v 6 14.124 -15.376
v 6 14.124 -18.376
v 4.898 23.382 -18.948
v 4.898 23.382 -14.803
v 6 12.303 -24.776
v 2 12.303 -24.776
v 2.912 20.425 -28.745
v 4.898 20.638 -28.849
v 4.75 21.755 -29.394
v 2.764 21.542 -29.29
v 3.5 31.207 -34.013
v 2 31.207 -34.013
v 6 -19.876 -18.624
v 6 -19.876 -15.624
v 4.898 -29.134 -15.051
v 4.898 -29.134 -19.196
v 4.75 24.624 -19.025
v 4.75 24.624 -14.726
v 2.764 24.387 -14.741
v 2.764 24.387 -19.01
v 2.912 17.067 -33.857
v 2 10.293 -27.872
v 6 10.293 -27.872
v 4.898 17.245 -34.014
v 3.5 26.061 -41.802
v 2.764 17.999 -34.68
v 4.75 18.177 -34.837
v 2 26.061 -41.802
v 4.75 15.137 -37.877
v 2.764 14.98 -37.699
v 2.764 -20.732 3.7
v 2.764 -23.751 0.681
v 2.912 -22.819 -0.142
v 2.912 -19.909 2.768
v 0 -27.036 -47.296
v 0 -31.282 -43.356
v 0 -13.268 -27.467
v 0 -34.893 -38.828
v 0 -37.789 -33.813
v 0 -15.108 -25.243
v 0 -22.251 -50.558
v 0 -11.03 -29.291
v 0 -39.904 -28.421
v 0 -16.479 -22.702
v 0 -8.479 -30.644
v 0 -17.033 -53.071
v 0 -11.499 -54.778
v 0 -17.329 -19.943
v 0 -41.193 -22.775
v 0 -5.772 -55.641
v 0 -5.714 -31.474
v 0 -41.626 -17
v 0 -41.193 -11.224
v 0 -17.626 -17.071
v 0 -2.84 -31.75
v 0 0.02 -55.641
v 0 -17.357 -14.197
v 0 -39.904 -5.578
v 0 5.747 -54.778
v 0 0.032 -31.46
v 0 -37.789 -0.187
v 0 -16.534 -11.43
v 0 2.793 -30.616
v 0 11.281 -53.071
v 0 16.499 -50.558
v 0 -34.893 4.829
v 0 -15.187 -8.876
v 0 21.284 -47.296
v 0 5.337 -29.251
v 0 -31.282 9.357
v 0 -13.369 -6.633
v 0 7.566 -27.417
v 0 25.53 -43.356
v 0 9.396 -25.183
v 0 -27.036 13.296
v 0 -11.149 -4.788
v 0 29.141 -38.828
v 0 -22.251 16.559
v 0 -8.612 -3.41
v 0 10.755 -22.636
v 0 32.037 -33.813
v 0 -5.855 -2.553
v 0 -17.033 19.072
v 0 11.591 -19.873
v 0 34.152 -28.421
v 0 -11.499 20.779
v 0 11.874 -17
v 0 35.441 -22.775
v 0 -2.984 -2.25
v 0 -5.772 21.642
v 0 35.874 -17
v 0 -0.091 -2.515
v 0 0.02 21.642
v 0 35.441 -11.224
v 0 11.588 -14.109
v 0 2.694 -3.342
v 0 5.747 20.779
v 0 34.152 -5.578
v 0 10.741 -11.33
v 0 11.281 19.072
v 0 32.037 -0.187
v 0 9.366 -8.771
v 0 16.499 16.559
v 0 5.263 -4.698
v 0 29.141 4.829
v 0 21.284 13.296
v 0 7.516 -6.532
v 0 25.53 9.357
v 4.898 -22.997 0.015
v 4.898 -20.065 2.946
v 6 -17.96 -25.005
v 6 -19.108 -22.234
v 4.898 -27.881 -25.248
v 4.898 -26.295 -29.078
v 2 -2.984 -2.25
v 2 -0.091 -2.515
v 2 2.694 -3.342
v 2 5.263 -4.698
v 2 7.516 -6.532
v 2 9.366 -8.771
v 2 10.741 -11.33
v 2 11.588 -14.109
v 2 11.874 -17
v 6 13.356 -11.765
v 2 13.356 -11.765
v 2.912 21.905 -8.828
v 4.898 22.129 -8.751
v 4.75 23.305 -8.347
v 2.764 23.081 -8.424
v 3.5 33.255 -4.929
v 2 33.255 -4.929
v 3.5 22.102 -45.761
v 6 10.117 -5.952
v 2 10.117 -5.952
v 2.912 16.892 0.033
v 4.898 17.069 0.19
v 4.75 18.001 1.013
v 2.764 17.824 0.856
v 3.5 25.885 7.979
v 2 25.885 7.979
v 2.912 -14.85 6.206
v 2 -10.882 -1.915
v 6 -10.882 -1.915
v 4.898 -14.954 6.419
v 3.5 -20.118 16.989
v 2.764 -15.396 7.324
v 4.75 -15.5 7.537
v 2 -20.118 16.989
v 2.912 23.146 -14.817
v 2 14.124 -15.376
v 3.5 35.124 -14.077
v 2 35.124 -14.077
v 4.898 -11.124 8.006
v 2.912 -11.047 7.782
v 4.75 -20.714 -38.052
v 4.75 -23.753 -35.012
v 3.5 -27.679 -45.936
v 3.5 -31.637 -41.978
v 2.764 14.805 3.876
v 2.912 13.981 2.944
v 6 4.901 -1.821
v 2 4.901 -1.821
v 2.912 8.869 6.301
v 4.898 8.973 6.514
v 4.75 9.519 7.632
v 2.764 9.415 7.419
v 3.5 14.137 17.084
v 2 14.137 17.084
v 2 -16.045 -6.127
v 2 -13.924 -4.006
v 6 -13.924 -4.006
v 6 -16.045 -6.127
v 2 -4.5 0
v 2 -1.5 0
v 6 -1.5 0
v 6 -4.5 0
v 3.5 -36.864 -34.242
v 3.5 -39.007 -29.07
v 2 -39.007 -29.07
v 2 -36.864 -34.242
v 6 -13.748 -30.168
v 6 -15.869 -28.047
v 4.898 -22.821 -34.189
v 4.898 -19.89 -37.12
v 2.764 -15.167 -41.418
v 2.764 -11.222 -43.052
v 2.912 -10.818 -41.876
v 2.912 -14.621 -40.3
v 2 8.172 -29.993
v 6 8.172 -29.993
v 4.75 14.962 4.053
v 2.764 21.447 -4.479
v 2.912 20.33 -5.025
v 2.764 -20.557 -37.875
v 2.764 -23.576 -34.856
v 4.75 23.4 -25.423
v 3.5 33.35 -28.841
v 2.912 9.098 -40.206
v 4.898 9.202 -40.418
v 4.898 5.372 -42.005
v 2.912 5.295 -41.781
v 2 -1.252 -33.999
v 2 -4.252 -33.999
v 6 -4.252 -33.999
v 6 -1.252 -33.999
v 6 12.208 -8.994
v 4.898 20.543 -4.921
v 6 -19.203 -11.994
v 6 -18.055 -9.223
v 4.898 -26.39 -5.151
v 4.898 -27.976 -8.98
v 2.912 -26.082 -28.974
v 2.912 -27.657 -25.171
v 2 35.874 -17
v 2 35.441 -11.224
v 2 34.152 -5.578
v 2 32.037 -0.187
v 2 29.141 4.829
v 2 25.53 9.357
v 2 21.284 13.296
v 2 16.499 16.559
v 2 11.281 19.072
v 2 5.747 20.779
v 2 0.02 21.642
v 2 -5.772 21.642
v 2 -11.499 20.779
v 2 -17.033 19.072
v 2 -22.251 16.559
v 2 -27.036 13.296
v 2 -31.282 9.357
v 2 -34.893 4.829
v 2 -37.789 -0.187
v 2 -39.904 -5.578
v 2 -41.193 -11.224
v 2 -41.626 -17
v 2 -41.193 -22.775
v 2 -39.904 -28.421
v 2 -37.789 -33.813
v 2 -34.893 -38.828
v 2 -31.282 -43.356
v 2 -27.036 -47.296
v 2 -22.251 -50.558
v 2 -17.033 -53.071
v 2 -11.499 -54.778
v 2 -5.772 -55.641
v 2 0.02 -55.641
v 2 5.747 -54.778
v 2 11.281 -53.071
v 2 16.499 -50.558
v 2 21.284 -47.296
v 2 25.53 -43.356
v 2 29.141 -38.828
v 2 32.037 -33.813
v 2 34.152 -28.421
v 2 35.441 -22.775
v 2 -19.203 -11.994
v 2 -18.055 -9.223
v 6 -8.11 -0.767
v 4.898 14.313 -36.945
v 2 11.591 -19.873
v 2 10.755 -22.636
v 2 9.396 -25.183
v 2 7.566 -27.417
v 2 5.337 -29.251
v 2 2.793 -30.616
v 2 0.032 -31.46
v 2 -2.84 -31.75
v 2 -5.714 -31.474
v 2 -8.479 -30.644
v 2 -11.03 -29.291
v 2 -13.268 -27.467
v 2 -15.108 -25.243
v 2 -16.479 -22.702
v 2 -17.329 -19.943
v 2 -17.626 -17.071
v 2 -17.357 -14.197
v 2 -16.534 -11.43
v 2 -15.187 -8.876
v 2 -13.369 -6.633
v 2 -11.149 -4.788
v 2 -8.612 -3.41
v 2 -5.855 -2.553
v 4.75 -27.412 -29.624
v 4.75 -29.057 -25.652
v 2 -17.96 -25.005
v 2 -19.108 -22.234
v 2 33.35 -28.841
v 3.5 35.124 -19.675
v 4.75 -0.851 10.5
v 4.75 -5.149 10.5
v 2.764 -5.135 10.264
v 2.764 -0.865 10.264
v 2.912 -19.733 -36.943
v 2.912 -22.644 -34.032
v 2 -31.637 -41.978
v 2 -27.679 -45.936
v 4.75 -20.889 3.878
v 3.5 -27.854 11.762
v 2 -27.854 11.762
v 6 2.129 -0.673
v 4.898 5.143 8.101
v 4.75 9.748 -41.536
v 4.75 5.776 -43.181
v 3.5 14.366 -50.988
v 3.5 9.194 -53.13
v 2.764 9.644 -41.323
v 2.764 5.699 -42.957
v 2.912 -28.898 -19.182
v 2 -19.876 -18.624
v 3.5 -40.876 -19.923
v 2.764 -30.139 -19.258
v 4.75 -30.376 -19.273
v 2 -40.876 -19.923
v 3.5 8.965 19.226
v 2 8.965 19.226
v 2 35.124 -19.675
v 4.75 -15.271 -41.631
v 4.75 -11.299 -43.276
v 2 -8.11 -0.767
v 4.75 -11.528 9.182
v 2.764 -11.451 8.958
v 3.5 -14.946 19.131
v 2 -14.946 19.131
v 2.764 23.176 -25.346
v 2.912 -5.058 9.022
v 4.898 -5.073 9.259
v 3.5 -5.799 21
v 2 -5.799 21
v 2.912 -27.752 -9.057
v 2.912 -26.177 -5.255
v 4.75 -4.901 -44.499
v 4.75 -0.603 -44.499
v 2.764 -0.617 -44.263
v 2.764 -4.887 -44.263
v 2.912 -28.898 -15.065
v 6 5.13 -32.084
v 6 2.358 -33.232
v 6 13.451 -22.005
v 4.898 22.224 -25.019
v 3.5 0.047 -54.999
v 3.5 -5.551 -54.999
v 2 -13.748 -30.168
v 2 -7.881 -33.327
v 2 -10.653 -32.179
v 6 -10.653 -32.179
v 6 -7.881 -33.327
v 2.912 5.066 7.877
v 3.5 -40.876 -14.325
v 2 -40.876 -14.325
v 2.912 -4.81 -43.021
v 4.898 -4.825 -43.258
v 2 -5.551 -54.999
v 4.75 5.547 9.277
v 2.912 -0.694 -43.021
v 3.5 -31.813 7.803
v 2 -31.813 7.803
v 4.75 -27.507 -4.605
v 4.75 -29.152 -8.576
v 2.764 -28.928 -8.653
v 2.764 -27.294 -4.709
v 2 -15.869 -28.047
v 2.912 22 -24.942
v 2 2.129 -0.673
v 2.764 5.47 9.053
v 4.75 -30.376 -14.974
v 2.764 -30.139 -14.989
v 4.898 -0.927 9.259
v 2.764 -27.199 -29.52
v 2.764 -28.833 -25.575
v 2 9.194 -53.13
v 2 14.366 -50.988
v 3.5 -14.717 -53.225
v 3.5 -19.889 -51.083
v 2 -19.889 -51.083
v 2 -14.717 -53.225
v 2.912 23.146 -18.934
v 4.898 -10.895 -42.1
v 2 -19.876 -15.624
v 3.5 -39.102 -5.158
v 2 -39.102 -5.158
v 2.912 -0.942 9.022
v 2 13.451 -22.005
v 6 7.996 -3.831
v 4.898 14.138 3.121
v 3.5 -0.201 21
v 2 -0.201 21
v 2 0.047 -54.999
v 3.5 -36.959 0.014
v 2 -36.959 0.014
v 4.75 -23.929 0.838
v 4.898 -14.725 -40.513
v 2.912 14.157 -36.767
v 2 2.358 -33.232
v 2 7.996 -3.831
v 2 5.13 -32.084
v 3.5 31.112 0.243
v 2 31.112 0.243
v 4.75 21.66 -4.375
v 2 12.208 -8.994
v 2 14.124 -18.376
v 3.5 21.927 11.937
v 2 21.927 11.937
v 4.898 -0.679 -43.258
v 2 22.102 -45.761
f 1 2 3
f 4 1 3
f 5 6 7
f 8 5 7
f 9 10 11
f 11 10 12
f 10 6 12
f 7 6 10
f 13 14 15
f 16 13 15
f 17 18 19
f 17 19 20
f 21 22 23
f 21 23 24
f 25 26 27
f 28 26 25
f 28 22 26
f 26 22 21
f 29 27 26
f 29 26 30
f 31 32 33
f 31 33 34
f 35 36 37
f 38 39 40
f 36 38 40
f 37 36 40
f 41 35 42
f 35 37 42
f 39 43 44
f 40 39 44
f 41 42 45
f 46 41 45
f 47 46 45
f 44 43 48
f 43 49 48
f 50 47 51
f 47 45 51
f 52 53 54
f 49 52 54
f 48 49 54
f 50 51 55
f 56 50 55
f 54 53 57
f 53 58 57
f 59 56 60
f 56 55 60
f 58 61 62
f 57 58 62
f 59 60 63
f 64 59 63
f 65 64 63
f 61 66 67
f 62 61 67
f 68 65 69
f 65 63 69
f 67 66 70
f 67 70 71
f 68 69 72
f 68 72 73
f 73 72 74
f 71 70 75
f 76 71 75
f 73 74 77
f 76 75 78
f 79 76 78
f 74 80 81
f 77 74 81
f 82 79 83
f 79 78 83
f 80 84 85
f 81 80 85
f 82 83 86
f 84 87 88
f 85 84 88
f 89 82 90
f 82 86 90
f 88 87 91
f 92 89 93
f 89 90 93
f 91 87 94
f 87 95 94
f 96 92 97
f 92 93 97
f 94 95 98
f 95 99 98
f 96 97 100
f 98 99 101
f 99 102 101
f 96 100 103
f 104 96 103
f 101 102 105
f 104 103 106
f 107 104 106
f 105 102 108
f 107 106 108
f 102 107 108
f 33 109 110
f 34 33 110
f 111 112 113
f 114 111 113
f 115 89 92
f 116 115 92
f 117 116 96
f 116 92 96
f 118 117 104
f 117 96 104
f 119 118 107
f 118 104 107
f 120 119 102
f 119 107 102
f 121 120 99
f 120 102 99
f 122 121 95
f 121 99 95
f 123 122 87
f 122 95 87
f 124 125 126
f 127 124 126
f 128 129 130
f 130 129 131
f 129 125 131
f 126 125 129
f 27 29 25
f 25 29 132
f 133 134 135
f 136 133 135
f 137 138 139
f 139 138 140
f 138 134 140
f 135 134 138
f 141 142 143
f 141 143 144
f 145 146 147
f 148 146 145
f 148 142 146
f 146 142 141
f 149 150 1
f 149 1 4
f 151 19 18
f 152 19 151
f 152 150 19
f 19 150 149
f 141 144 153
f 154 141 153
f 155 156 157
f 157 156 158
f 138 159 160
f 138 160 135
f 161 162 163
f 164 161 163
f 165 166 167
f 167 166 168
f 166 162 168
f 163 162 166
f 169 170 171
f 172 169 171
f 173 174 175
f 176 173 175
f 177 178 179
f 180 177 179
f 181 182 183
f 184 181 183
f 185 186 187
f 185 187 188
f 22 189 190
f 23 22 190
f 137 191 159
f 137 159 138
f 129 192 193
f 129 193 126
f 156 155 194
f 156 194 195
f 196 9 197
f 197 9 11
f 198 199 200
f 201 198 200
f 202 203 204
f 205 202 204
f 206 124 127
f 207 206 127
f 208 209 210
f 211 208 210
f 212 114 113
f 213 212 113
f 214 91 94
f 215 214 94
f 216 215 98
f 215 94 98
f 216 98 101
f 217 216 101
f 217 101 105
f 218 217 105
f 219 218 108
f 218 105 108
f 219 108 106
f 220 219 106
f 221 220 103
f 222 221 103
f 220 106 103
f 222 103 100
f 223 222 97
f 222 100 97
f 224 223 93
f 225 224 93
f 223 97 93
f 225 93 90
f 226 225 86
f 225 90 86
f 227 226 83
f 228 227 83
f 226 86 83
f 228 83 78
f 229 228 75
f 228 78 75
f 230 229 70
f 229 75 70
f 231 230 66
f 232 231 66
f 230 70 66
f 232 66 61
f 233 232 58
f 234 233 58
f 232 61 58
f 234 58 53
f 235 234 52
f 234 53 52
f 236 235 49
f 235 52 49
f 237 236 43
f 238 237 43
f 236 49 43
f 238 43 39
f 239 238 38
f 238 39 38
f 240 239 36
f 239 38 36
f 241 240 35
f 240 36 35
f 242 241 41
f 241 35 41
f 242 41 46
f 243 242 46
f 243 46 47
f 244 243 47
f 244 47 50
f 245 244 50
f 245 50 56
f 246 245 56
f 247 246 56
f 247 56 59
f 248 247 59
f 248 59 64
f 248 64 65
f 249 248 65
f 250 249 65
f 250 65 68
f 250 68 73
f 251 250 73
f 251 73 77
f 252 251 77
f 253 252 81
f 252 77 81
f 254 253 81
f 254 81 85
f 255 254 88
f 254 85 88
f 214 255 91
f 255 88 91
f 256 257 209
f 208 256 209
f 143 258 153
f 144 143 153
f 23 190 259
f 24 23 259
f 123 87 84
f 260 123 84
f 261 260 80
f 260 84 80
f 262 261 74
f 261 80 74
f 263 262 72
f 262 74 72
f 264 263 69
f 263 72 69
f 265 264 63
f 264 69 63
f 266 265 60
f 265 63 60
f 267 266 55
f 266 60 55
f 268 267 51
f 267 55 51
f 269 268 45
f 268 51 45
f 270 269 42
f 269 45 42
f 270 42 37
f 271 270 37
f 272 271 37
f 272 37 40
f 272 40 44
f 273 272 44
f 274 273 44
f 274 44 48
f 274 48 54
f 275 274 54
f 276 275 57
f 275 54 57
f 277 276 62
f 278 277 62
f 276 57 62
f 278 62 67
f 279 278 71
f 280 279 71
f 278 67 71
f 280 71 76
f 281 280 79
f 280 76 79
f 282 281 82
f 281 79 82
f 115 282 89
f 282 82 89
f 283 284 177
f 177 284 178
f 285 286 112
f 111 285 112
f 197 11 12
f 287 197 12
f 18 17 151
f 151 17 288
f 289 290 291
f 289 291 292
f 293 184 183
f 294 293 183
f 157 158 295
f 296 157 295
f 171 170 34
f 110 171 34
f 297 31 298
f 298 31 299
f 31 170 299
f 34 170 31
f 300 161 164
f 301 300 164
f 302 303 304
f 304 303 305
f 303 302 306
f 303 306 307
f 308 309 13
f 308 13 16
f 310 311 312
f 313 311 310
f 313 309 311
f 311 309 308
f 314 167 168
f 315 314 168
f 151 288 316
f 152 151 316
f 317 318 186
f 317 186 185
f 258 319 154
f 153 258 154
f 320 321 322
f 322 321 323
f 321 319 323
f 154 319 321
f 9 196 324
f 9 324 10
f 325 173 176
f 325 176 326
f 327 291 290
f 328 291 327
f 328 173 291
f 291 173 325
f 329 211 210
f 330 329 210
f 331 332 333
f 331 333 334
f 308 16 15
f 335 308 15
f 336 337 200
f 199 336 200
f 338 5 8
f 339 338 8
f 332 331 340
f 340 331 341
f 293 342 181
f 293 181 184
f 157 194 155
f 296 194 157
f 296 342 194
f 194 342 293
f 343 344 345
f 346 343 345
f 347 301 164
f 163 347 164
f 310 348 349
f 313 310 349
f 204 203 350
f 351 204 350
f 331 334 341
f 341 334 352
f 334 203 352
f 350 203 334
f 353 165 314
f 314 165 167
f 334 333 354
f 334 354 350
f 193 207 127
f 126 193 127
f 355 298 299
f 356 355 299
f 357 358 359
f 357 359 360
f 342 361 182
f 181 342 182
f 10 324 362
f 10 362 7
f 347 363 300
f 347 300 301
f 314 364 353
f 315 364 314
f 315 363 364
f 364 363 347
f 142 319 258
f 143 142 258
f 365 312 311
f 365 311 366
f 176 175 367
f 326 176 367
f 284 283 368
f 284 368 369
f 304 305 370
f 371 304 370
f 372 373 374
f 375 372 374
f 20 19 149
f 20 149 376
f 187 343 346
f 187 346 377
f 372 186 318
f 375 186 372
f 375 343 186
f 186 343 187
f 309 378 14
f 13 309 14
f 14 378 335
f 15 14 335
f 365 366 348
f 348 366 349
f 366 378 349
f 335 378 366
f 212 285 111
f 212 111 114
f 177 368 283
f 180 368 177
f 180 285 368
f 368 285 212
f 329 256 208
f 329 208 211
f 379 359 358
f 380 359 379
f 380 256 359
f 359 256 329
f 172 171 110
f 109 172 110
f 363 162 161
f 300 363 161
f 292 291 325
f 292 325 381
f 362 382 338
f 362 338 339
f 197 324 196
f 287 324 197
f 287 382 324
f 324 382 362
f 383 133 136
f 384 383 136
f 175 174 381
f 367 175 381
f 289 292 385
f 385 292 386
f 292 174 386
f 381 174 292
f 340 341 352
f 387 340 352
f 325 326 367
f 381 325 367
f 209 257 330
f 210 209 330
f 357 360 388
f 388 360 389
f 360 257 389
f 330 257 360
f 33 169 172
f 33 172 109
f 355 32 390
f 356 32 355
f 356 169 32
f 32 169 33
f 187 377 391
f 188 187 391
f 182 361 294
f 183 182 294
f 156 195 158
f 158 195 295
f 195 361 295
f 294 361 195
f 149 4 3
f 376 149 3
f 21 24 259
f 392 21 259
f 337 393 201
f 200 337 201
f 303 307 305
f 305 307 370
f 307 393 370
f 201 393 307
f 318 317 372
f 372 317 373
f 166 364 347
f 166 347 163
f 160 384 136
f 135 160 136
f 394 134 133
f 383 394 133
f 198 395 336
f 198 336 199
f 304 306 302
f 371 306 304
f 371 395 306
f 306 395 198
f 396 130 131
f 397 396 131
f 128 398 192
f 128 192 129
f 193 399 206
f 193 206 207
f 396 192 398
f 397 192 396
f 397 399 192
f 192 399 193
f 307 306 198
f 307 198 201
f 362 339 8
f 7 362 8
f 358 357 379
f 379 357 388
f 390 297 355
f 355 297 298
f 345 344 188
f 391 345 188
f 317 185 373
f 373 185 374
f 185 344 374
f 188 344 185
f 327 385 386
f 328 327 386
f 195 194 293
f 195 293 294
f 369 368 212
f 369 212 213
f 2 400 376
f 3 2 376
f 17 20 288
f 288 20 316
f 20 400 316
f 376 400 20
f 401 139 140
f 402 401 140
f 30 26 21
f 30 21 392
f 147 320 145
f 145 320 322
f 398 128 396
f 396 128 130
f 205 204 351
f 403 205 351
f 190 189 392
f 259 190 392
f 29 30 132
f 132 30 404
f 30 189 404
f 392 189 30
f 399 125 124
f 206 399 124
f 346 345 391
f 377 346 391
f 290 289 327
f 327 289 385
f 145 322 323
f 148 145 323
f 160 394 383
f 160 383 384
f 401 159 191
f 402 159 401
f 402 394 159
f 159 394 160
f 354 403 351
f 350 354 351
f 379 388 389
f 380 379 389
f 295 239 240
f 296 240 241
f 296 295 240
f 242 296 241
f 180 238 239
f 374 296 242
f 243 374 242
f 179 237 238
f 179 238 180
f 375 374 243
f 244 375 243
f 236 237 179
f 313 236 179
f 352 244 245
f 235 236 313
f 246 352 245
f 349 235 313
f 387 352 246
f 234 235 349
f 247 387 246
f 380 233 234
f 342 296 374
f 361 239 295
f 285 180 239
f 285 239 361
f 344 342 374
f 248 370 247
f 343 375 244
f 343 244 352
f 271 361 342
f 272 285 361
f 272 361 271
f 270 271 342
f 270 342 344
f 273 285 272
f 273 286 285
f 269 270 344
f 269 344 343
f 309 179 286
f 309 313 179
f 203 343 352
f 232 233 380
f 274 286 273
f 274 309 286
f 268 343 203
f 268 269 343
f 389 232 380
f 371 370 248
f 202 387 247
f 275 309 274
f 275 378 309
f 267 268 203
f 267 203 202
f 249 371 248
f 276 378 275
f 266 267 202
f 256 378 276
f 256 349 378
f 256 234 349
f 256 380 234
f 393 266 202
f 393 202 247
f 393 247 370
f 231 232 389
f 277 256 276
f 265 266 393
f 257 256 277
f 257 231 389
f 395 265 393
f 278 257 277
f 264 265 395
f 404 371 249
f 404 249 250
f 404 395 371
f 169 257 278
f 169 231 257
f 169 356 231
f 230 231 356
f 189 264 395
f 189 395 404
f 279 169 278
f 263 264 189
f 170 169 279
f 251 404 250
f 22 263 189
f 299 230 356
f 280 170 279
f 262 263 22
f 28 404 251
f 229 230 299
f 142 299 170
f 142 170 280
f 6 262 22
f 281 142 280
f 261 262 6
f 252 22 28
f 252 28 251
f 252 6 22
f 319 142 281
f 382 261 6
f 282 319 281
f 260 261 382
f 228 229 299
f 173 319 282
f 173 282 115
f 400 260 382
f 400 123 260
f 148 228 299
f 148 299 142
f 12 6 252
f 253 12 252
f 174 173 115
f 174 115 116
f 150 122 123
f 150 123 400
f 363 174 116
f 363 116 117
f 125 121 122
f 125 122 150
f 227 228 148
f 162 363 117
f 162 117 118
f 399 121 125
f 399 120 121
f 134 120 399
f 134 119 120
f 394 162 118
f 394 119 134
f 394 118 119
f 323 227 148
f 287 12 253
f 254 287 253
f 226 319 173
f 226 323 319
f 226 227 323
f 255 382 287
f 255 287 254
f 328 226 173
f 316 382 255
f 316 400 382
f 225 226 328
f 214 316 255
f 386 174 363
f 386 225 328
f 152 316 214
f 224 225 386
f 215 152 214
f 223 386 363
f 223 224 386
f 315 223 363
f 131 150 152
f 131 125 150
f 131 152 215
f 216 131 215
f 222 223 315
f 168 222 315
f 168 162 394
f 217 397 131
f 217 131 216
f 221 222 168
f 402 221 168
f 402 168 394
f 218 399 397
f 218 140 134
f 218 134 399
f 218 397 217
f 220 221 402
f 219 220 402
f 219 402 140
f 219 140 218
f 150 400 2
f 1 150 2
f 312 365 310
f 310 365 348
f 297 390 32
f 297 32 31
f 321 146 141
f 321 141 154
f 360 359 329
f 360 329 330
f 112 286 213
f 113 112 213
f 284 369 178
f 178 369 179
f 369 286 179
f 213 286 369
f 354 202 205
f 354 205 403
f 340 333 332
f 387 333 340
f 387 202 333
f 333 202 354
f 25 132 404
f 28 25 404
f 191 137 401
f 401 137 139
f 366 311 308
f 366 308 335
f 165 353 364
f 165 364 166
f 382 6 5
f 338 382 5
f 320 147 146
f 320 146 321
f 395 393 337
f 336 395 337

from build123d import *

# Parameters (mm, degrees)
F1_DEPTH    = 6
F2_W        = 6
F2_H        = 1.25
F3_DEPTH    = 2
F4_T1_DEPTH = 132.091103715
F6_COUNT    = 16
F5_R        = 38.75
F7_DEPTH    = 2


# Not quite as in the source:
# - a fillet or chamfer that OpenCascade refuses, or shapes differently, is made with other operations: its cross-section is extruded or revolved along the edge and cut away or added


with BuildPart() as f1:
    # F0 (on Front) → F1 (new body)
    with BuildSketch(Plane.XZ):
        Polygon((0, 21), (0, 0), (6, 0), (3.5, 21), align=None)
    extrude(amount=F1_DEPTH)

    # F2 (on face) → F3 (cut)
    with BuildSketch(Plane(origin=(5.9161542761, 0, 0.7043040805), x_dir=(0, 1, 0), z_dir=(0.9929882742, 0, 0.1182128898))):
        with Locations((-3, 9.2398656526)):
            Rectangle(F2_W, F2_H)
    extrude(amount=-F3_DEPTH, mode=Mode.SUBTRACT)

    # F4: chamfer of 1.5 x 24.25 on 2 edges, made by hand

    # F4_s2 → F4_t1 (cut)
    with BuildSketch(Plane.YZ.offset(-63.0455518575)):
        Polygon((-4.5, 0), (-6, 24.25), (-6, 0), align=None)
        Polygon((-1.5, 0), (0, 24.25), (0, 0), align=None)
    extrude(amount=F4_T1_DEPTH, mode=Mode.SUBTRACT)


with BuildPart() as f6_1:
    # F6: instance of F1
    add(f1.part.rotate(Axis((0, -2.8759991925, -16.9995477528), (1, 0, 0)), 1 * 360 / F6_COUNT))


with BuildPart() as f6_2:
    # F6: instance of F1
    add(f1.part.rotate(Axis((0, -2.8759991925, -16.9995477528), (1, 0, 0)), 2 * 360 / F6_COUNT))


with BuildPart() as f6_3:
    # F6: instance of F1
    add(f1.part.rotate(Axis((0, -2.8759991925, -16.9995477528), (1, 0, 0)), 3 * 360 / F6_COUNT))


with BuildPart() as f6_4:
    # F6: instance of F1
    add(f1.part.rotate(Axis((0, -2.8759991925, -16.9995477528), (1, 0, 0)), 4 * 360 / F6_COUNT))


with BuildPart() as f6_5:
    # F6: instance of F1
    add(f1.part.rotate(Axis((0, -2.8759991925, -16.9995477528), (1, 0, 0)), 5 * 360 / F6_COUNT))


with BuildPart() as f6_6:
    # F6: instance of F1
    add(f1.part.rotate(Axis((0, -2.8759991925, -16.9995477528), (1, 0, 0)), 6 * 360 / F6_COUNT))


with BuildPart() as f6_7:
    # F6: instance of F1
    add(f1.part.rotate(Axis((0, -2.8759991925, -16.9995477528), (1, 0, 0)), 7 * 360 / F6_COUNT))


with BuildPart() as f6_8:
    # F6: instance of F1
    add(f1.part.rotate(Axis((0, -2.8759991925, -16.9995477528), (1, 0, 0)), 8 * 360 / F6_COUNT))


with BuildPart() as f6_9:
    # F6: instance of F1
    add(f1.part.rotate(Axis((0, -2.8759991925, -16.9995477528), (1, 0, 0)), 9 * 360 / F6_COUNT))


with BuildPart() as f6_10:
    # F6: instance of F1
    add(f1.part.rotate(Axis((0, -2.8759991925, -16.9995477528), (1, 0, 0)), 10 * 360 / F6_COUNT))


with BuildPart() as f6_11:
    # F6: instance of F1
    add(f1.part.rotate(Axis((0, -2.8759991925, -16.9995477528), (1, 0, 0)), 11 * 360 / F6_COUNT))


with BuildPart() as f6_12:
    # F6: instance of F1
    add(f1.part.rotate(Axis((0, -2.8759991925, -16.9995477528), (1, 0, 0)), 12 * 360 / F6_COUNT))


with BuildPart() as f6_13:
    # F6: instance of F1
    add(f1.part.rotate(Axis((0, -2.8759991925, -16.9995477528), (1, 0, 0)), 13 * 360 / F6_COUNT))


with BuildPart() as f6_14:
    # F6: instance of F1
    add(f1.part.rotate(Axis((0, -2.8759991925, -16.9995477528), (1, 0, 0)), 14 * 360 / F6_COUNT))


with BuildPart() as f6_15:
    # F6: instance of F1
    add(f1.part.rotate(Axis((0, -2.8759991925, -16.9995477528), (1, 0, 0)), 15 * 360 / F6_COUNT))


with BuildPart() as f1_1:
    add(f1.part)

    add(f6_1.part)  # F7 merges F6_1

    add(f6_2.part)  # F7 merges F6_2

    add(f6_3.part)  # F7 merges F6_3

    add(f6_4.part)  # F7 merges F6_4

    add(f6_5.part)  # F7 merges F6_5

    add(f6_6.part)  # F7 merges F6_6

    add(f6_7.part)  # F7 merges F6_7

    add(f6_8.part)  # F7 merges F6_8

    add(f6_9.part)  # F7 merges F6_9

    add(f6_10.part)  # F7 merges F6_10

    add(f6_11.part)  # F7 merges F6_11

    add(f6_12.part)  # F7 merges F6_12

    add(f6_13.part)  # F7 merges F6_13

    add(f6_14.part)  # F7 merges F6_14

    add(f6_15.part)  # F7 merges F6_15
    # F5 (on Right) → F7 (join)
    with BuildSketch(Plane.YZ):
        with Locations((-2.8759991925, -16.9995477528)):
            Circle(F5_R)
        with BuildLine():
            ThreePointArc((-2.9835881284, -2.2499401438), (7.5157177781, -6.53175341), (11.8740008075, -16.9995477528))
            ThreePointArc((11.8740008075, -16.9995477528), (-13.2677161631, -27.4673420956), (-2.9835881284, -2.2499401438))
        make_face(mode=Mode.SUBTRACT)
    extrude(amount=F7_DEPTH)


solid = f1_1.part
